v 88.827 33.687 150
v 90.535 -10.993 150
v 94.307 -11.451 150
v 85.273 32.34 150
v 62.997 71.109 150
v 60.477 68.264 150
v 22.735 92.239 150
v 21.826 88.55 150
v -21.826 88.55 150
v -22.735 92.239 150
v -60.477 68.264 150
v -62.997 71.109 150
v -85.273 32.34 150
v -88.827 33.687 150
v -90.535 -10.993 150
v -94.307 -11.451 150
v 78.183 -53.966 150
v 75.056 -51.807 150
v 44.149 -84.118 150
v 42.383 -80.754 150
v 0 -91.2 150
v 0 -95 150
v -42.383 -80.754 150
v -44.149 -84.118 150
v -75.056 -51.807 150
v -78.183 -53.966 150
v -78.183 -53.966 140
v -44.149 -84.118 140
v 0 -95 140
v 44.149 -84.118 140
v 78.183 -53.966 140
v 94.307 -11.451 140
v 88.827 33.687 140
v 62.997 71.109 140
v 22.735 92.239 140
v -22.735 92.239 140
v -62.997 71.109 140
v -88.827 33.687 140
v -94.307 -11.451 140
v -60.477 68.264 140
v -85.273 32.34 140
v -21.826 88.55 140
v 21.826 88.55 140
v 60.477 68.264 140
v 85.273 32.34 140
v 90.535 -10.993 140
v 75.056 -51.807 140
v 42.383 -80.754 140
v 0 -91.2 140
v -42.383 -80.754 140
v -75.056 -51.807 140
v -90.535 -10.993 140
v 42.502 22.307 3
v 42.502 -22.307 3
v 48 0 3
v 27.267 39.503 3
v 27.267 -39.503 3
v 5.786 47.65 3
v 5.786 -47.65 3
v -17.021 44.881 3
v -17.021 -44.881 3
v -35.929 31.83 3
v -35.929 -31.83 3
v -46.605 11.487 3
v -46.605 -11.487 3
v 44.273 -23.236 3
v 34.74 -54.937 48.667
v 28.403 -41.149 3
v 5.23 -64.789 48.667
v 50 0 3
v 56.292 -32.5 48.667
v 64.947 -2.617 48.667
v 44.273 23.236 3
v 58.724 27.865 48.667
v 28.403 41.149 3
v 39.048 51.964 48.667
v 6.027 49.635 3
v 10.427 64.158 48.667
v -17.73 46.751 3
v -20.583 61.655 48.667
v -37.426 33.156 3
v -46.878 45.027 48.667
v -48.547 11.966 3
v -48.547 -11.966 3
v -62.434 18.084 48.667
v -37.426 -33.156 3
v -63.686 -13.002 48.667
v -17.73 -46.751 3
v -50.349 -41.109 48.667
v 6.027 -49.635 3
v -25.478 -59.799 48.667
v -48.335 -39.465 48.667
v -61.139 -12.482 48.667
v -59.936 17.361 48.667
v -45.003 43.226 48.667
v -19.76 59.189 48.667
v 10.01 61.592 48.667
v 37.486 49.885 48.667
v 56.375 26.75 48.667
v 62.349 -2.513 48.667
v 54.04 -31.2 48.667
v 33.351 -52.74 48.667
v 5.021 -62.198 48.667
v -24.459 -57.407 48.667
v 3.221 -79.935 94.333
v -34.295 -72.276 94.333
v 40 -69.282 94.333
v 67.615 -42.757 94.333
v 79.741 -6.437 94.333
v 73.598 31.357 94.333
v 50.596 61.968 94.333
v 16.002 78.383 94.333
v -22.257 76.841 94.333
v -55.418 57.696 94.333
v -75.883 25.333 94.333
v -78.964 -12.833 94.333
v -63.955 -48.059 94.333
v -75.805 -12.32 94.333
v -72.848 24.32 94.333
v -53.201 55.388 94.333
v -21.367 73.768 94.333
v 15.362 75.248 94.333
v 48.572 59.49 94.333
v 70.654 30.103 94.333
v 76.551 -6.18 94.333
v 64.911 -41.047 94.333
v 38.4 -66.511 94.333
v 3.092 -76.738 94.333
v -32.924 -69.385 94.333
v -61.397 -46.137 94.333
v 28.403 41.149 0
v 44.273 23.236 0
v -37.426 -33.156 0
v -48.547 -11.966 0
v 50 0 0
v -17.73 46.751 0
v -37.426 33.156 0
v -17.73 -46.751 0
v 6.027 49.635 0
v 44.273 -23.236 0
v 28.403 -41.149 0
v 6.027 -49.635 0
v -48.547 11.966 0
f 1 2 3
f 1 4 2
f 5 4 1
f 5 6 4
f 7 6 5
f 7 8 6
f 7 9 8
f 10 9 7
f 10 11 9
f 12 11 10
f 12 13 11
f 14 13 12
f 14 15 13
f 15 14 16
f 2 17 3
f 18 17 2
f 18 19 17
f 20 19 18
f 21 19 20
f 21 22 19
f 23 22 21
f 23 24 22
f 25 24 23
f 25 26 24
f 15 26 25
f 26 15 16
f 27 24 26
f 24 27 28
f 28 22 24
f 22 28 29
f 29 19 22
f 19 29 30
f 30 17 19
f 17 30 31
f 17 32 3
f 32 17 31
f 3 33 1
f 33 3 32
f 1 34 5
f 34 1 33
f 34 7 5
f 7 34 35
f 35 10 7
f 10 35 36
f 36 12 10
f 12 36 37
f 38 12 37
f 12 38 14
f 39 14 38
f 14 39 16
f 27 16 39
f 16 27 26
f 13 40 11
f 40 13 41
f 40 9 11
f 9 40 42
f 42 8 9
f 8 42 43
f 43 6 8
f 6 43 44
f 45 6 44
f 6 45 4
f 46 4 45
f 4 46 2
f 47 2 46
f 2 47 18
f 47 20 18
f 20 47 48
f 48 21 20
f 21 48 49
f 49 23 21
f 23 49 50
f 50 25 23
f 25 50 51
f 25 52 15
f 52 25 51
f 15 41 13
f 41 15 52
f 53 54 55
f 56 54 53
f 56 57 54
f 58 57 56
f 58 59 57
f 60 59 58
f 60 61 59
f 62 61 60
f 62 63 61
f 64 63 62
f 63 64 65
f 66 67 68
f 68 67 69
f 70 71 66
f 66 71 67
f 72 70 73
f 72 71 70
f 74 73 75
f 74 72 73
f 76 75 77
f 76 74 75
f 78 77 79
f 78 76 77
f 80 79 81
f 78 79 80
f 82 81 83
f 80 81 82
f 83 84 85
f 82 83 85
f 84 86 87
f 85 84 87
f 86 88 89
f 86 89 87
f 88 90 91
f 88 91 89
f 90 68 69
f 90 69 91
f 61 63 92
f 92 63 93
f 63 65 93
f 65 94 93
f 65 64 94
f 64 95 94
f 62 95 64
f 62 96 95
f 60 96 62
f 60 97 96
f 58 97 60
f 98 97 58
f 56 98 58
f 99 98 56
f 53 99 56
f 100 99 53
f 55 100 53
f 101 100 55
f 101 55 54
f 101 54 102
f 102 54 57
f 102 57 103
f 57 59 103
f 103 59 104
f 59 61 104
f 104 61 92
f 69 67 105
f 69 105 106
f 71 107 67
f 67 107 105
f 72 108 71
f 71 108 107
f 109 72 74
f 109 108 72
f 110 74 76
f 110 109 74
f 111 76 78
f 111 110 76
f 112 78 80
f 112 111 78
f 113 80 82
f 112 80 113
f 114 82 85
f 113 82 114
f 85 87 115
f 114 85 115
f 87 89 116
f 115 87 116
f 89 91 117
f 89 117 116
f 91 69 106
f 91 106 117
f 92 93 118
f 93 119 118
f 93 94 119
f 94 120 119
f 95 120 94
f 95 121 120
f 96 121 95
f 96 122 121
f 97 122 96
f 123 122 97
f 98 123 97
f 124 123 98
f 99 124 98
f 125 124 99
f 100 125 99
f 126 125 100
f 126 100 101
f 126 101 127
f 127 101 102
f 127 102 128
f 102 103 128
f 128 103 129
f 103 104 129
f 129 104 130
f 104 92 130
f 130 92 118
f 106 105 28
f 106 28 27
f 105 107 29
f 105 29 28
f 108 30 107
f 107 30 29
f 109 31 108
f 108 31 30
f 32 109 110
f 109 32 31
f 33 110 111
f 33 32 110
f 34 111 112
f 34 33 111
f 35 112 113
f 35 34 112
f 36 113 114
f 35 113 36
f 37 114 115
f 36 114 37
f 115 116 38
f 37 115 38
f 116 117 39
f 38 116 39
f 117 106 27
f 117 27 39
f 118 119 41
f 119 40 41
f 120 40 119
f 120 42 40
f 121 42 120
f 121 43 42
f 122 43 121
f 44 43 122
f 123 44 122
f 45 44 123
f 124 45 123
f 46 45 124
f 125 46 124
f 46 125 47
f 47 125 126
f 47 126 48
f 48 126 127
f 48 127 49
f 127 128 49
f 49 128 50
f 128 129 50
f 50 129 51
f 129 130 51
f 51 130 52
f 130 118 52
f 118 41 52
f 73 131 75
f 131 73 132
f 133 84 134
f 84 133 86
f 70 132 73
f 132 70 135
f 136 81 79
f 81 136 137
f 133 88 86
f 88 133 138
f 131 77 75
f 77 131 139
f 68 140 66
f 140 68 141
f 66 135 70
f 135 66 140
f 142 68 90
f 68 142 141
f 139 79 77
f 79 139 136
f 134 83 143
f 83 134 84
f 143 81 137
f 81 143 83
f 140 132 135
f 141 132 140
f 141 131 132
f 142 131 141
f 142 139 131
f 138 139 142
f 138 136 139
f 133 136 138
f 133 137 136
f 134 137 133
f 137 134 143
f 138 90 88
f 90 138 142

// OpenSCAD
//General Parameters Basic

//Do you want your vase to be solid (for use of slicer vase mode)
filling = "no"; //[yes,no]
//Outer Radius of the Base in mm
radius = 50; //[10:300]
//Total Height of the Vase in mm
height = 150; //[30:600] 
//number of sides that make up the outside (bigger then 3)
sides = 13; //
//Thickness of the Vase
thickness = 2; //[1:50]
//Degrees the top is twistes in realation to the base
degree_twist = 90; //[0:360]
//If twisted, of how many slices shall the vase consist
number_slices = 3; //[0:100]
//Factor of how much smaller/biller the top is in realation to the base
distortion = 1.9; // [0.1:5]
//How thick the buttom will be in mm
buttom = 3; 
//how tall straight top part is in mm
top = 10; 
//Do you want to have a twistes Vase?
twisting = "yes"; // [yes,no] 
//Do you want to have holes in the side of your Vase?
perforating = "no"; // [yes,no]


//Parameters for Holes
//Distance from the buttom to lowest Hole in mm
lower = 5; //[0:600]
//Distance from the tro straight part to highest hole in mm
upper = 5;  //[0:600
//Radius of the Holes
hole_radius = 3; //[0.5:30]
//How many holes shall there be in one plane (is a multiple of 2)
number_of_holes = 13; //[1:50]
//How many Sides shall the Holes have (Bigger number == cicles)
sides_holes = 8; //[3:100]
// Distance between Holes in mm
row_distance = 1; 


//General Calculated Values
inner_radius = radius - thickness; 
extrude_height = height - buttom - top;

//Hole Calculations
degree_holes  =360/number_of_holes;
row_height=row_distance+(2*hole_radius);
free_edge = height - lower - upper;
rest = free_edge % (row_height);
height_holes= free_edge - rest; //Height that can b used for holes
number_of_rows = height_holes/row_height-1;


hole_start = buttom+lower+hole_radius;



module Rim(solid){
difference(){
    circle(r=radius, $fn=sides);
    if(solid=="no"){
        circle(r=inner_radius, $fn = sides);
        }
    }
}



module extruded(rot){
    //Boden
    linear_extrude(height = buttom)Rim(solid="yes");

    if(rot=="yes"){
    //Oben
    translate([0,0,buttom+extrude_height])
    scale(v=[distortion,distortion,1])
    rotate([0,0,-degree_twist])
    linear_extrude(height = top)Rim(solid="no");

    //Rand
    translate([0,0,buttom])
    linear_extrude(height = extrude_height, twist=degree_twist, slices = number_slices, scale = distortion) Rim(solid="no");
    }
    
    
    if(rot=="no"){
        //Oben
    translate([0,0,buttom+extrude_height])
    scale(v=[distortion,distortion,1])
    linear_extrude(height = top)Rim(solid="no");

    //Rand
    translate([0,0,buttom])
    linear_extrude(height = extrude_height, scale = distortion) Rim(solid="no");
        }
    }



module extruded_filled(rot){
    //Boden
    linear_extrude(height = buttom)Rim(solid="yes");

    if(rot=="yes"){
    //Oben
    translate([0,0,buttom+extrude_height])
    scale(v=[distortion,distortion,1])
    rotate([0,0,-degree_twist])
    linear_extrude(height = top)Rim(solid="yes");

    //Rand
    translate([0,0,buttom])
    linear_extrude(height = extrude_height, twist=degree_twist, slices = number_slices, scale = distortion) Rim(solid="yes");
    }
    
    
    if(rot=="no"){
        //Oben
    translate([0,0,buttom+extrude_height])
    scale(v=[distortion,distortion,1])
    linear_extrude(height = top)Rim(solid="yes");

    //Rand
    translate([0,0,buttom])
    linear_extrude(height = extrude_height, scale = distortion) Rim(solid="yes");
        }
    }    




    
module holes(){
    translate([0,0,hole_start])
     for(row = [0:1:number_of_rows])
        translate([0,0,(row*row_height)])
        for(degree = [0 : degree_holes : 360])
            rotate([90,0,degree])
            cylinder(h=radius*5,r=hole_radius,center=true,
            $fn = sides_holes);
}

module cup(twisted,perforated){
    if(perforated=="yes"){
        if(twisted=="yes"){
            difference(){
            extruded(rot="yes");
            holes();
            }
        }
        if(twisted=="no"){
            difference(){
            extruded(rot="no");
            holes();
            }
        }}   
    
    
    if(perforated=="no"){
        if(twisted=="yes") extruded(rot="yes");
        if(twisted=="no")  extruded(rot="no");
    }
}


module cup_filled(twisted,perforated){
    if(perforated=="yes"){
        if(twisted=="yes"){
            difference(){
            extruded_filled(rot="yes");
            holes();
            }
        }
        if(twisted=="no"){
            difference(){
            extruded_filled(rot="no");
            holes();
            }
        }}   
    
    
    if(perforated=="no"){
        if(twisted=="yes") extruded_filled(rot="yes");
        if(twisted=="no")  extruded_filled(rot="no");
    }
}

    

if(filling=="no"){
cup(twisted=twisting,perforated=perforating);}
if(filling=="yes"){
cup_filled(twisted=twisting,perforated=perforating);}
